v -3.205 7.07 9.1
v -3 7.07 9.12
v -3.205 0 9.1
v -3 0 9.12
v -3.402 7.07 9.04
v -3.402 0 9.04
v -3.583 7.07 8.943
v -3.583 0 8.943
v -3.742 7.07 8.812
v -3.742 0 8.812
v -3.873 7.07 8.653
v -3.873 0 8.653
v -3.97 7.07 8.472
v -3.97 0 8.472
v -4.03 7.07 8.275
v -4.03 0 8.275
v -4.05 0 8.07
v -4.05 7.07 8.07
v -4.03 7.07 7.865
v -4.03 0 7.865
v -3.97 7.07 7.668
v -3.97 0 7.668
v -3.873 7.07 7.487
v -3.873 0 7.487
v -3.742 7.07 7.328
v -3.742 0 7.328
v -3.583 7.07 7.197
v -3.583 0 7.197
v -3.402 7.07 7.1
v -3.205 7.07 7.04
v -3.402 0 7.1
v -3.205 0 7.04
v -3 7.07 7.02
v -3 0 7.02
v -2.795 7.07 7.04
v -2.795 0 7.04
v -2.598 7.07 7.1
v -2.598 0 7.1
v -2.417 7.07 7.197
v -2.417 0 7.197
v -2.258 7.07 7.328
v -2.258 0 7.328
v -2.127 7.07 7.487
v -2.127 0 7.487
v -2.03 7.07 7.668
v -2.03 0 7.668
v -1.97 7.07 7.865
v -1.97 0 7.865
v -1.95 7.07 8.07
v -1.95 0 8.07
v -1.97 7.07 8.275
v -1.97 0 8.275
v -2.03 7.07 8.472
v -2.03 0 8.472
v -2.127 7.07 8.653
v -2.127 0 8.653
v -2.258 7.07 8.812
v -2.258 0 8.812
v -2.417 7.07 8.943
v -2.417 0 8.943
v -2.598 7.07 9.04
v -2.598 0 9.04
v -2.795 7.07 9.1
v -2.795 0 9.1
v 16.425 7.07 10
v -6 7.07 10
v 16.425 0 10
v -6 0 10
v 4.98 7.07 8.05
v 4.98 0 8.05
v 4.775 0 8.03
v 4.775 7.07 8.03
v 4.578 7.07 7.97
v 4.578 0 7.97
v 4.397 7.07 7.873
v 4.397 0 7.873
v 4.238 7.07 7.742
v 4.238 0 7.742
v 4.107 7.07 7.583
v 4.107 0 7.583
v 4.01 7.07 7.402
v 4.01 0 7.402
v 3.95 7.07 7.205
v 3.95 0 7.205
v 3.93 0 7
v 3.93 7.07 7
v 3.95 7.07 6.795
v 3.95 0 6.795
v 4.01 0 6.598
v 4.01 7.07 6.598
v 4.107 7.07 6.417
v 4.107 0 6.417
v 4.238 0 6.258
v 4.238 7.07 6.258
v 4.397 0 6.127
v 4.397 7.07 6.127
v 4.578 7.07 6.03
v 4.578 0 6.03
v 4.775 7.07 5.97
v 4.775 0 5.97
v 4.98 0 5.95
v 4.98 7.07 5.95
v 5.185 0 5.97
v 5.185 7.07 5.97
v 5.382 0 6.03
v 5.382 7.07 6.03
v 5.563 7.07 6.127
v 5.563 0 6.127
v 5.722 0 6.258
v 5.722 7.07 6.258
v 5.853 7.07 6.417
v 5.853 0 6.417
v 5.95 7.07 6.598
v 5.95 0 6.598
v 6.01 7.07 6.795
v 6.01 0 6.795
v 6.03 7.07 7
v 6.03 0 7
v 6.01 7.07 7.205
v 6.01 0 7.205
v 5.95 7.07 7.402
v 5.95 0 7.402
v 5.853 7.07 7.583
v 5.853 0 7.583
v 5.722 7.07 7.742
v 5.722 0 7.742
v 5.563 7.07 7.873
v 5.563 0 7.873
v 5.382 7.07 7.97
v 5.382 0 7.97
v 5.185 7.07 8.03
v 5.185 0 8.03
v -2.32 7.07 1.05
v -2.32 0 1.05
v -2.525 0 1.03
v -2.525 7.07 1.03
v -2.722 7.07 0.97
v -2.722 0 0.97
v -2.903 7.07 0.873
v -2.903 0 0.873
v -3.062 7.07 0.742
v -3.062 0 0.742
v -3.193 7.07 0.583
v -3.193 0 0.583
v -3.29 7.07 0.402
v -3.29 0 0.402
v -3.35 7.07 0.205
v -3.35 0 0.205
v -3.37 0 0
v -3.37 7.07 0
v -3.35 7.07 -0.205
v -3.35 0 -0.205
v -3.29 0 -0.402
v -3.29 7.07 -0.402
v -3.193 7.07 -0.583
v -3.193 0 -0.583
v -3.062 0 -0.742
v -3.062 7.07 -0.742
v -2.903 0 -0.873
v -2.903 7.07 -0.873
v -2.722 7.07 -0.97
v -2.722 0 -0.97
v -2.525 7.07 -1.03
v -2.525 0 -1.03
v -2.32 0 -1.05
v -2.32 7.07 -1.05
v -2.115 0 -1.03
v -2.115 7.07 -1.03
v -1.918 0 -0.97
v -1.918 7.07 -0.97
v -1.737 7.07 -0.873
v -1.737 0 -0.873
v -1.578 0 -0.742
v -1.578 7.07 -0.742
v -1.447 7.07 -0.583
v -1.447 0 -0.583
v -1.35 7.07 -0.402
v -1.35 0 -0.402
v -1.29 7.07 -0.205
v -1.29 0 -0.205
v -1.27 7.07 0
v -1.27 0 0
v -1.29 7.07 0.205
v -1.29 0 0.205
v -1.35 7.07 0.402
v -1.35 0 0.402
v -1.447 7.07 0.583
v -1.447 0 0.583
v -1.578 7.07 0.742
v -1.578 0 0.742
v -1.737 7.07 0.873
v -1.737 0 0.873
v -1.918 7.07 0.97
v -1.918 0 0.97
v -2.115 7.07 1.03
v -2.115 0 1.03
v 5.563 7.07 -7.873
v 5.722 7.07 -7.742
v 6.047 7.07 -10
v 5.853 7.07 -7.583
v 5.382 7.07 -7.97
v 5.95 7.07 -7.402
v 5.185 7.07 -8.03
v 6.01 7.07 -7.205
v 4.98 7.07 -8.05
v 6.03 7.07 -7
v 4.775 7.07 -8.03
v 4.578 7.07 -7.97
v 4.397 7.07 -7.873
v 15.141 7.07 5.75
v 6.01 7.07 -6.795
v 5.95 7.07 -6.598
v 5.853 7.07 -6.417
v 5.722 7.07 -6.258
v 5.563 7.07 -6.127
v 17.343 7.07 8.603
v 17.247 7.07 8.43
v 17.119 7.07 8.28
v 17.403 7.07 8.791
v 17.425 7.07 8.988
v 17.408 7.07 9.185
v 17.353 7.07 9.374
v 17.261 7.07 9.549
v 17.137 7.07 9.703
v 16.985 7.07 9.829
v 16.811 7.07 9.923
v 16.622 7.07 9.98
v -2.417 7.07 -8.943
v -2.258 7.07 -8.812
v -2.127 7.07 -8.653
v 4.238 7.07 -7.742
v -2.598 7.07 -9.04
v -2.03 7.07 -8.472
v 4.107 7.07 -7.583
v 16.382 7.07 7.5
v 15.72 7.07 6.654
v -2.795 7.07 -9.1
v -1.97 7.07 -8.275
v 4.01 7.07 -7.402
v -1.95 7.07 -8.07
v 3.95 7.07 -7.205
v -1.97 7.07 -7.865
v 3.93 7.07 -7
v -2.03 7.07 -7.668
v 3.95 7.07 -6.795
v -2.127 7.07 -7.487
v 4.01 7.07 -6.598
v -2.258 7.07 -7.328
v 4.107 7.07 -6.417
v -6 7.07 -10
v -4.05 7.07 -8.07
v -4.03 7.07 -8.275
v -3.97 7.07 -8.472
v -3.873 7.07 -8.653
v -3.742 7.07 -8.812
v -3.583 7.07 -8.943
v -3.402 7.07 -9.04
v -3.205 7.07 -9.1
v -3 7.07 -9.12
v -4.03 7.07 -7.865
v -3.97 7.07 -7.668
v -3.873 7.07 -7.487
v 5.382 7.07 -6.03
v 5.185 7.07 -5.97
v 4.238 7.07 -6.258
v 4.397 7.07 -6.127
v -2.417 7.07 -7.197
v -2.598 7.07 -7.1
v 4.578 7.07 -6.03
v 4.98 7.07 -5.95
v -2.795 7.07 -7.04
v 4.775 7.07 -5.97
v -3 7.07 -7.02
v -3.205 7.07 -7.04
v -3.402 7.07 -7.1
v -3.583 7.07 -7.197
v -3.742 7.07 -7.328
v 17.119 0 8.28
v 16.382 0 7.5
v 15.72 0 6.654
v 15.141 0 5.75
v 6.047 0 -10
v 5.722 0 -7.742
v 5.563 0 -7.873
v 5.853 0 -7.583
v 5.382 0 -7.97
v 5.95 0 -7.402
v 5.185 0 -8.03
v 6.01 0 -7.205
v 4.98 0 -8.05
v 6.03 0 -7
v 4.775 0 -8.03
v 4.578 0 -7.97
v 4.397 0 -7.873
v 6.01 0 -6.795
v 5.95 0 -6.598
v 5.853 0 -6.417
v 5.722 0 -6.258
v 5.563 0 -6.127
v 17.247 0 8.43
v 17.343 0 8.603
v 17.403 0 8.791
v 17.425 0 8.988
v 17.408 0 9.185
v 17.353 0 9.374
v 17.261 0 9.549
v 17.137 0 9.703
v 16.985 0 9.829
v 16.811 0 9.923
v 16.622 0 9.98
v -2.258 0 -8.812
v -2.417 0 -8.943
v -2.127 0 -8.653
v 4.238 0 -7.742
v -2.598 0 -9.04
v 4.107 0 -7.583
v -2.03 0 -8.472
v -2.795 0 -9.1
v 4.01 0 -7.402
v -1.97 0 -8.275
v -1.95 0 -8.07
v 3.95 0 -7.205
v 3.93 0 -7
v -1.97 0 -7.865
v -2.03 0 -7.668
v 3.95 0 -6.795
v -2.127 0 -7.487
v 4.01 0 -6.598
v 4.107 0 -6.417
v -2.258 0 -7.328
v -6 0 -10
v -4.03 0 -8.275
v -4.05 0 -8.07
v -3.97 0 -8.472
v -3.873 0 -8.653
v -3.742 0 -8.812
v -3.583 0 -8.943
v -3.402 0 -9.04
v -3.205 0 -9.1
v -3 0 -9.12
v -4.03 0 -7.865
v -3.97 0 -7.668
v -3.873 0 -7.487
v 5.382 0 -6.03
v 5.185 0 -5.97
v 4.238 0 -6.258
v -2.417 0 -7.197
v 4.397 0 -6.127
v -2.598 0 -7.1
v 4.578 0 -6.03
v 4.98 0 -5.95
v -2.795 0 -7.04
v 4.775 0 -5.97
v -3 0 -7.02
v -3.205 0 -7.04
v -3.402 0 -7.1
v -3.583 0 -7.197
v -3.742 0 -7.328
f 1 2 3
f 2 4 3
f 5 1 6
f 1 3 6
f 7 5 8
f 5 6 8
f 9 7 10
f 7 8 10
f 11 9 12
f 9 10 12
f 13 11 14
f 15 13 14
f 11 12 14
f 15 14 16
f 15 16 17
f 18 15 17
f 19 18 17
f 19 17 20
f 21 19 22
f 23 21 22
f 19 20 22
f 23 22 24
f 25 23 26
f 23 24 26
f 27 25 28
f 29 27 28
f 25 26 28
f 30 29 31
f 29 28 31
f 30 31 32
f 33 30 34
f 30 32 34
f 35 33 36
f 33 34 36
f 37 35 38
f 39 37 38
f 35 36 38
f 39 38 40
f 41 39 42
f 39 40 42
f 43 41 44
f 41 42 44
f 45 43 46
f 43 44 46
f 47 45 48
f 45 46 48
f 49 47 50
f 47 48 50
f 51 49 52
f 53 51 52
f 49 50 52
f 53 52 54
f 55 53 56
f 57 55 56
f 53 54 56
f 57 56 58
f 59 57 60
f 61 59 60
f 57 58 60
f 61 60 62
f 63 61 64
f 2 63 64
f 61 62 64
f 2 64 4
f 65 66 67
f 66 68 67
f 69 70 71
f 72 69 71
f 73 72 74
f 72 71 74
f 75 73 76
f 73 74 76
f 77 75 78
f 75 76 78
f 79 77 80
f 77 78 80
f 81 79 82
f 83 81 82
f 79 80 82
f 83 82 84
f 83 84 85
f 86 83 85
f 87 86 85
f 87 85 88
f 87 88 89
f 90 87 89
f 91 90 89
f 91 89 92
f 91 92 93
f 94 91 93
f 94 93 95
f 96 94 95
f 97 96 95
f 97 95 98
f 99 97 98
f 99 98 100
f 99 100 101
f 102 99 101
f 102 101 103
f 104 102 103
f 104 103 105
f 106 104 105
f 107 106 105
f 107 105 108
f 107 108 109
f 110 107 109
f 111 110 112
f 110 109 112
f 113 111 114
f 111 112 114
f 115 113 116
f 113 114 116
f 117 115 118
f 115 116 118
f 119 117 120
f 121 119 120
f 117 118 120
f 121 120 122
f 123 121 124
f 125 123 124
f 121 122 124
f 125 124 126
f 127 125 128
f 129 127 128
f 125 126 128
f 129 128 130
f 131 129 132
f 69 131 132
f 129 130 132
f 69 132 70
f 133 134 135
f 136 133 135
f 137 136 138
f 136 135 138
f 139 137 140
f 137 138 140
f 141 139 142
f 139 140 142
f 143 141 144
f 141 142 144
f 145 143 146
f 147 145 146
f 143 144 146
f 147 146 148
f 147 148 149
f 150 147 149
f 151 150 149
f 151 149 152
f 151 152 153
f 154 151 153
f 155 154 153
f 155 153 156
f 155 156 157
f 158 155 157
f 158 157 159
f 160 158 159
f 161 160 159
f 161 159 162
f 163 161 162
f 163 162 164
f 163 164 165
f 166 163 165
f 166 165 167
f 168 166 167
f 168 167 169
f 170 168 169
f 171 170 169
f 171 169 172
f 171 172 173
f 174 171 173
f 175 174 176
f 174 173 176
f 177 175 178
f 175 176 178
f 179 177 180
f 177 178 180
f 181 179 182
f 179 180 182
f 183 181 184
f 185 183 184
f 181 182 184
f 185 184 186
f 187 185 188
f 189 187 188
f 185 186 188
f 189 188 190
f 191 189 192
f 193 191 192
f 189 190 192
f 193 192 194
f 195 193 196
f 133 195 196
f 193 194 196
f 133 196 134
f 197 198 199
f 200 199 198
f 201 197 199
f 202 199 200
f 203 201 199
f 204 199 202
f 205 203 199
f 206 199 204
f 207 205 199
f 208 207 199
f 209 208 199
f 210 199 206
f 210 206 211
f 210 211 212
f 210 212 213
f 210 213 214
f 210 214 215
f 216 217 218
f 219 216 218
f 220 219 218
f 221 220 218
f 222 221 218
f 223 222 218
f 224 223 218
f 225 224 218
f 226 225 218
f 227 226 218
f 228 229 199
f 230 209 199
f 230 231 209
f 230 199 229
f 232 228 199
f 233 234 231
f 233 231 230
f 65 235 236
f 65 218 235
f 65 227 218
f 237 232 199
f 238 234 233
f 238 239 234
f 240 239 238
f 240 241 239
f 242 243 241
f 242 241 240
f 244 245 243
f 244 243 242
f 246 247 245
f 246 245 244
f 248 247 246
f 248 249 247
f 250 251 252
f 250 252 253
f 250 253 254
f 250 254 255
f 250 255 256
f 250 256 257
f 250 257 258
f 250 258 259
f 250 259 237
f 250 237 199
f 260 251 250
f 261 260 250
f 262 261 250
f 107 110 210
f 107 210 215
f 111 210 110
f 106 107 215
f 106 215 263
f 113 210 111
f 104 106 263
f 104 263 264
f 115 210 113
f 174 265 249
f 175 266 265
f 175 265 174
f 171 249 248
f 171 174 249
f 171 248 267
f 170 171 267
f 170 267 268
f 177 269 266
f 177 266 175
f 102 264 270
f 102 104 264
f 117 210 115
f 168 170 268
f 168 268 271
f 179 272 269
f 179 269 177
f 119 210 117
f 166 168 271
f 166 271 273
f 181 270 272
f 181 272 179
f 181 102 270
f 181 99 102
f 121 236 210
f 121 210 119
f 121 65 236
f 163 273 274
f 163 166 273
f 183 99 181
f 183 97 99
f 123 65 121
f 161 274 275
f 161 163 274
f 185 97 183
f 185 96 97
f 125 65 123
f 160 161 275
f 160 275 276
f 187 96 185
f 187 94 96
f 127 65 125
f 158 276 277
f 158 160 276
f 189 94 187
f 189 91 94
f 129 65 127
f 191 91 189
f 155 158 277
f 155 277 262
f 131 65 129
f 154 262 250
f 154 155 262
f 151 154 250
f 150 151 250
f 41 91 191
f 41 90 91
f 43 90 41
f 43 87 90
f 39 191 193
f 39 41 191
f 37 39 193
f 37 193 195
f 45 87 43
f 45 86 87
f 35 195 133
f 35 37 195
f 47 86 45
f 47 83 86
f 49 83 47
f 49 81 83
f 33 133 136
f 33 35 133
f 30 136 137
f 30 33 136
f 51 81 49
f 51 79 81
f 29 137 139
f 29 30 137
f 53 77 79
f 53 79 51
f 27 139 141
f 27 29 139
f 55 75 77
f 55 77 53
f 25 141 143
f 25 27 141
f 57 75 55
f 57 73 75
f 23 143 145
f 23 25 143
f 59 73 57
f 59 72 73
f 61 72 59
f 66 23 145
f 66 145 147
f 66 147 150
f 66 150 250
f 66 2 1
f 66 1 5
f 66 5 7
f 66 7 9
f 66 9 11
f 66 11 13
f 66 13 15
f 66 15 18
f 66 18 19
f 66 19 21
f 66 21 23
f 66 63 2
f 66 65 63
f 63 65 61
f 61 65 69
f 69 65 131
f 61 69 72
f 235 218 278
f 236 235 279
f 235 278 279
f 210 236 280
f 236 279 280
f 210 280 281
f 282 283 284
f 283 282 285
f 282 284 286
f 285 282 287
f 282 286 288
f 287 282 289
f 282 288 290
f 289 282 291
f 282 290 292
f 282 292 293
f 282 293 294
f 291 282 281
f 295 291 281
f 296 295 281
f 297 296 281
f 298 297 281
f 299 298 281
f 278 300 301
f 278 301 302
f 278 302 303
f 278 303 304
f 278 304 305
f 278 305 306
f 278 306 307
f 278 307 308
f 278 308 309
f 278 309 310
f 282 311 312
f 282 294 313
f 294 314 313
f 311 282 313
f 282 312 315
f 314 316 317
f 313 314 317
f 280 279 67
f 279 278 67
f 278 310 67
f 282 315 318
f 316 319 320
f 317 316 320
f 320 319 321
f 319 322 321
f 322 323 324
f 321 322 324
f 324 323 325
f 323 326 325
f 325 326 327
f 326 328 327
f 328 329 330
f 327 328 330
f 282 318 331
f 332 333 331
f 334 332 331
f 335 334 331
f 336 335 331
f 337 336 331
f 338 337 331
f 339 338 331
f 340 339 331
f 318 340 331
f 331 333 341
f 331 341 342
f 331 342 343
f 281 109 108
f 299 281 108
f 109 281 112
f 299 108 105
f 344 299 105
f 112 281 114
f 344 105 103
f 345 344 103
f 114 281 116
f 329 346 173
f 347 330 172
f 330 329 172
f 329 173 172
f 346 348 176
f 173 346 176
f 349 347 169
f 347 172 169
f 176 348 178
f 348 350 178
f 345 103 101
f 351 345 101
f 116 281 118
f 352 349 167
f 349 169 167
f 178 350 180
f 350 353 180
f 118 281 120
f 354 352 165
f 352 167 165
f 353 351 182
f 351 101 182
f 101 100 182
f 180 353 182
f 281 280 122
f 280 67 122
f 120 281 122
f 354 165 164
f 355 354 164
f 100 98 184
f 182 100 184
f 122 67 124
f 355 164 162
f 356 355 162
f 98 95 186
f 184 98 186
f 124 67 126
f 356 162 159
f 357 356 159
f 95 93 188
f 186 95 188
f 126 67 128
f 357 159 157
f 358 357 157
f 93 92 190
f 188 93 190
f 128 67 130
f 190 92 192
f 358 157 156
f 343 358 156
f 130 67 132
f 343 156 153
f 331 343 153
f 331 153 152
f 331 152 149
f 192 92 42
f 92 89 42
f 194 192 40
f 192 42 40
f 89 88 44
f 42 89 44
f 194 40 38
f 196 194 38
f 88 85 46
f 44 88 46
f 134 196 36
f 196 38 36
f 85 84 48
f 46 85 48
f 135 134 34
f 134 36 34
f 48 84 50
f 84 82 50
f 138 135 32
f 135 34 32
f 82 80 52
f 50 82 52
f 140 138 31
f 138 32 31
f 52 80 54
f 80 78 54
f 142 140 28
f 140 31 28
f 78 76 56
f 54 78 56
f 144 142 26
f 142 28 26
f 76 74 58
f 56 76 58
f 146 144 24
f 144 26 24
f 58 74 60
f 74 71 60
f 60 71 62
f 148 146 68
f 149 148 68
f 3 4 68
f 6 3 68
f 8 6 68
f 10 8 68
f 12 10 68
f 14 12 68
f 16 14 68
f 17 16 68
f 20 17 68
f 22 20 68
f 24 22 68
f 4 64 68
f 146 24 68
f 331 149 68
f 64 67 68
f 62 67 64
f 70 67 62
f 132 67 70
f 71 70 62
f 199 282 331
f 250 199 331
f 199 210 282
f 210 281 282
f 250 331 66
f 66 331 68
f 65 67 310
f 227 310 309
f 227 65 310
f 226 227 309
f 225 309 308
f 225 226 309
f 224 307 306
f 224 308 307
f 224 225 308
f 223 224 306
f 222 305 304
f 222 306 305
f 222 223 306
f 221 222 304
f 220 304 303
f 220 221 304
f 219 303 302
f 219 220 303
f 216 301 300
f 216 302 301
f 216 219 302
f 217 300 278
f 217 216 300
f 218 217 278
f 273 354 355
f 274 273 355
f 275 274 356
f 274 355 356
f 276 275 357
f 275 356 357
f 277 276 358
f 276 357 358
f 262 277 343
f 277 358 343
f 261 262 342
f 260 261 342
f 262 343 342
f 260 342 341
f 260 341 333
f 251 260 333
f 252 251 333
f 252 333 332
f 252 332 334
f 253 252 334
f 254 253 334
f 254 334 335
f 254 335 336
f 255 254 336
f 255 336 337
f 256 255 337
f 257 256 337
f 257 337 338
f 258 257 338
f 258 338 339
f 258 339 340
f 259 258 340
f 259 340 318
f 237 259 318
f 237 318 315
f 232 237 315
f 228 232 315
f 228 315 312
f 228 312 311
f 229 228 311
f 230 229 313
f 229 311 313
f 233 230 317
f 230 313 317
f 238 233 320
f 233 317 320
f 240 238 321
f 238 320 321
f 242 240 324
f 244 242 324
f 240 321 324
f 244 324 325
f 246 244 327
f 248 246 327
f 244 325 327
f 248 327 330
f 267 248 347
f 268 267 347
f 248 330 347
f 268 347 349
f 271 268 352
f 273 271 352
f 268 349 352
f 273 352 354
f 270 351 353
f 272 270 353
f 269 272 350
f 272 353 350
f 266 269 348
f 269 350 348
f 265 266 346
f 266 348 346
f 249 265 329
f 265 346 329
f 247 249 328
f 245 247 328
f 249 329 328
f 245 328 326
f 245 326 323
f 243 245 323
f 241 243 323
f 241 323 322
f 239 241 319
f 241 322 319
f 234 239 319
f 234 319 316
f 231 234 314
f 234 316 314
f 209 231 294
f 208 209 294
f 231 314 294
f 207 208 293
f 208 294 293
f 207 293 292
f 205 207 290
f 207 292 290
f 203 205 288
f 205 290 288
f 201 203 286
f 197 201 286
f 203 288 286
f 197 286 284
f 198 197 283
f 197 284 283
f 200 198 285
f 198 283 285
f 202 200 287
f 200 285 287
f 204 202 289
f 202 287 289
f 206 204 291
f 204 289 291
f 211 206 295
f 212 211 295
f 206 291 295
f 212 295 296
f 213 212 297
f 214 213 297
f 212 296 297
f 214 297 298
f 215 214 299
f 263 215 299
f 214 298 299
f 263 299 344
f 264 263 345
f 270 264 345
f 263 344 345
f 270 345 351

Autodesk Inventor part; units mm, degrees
ref_plane "YZ Plane" through (0, 0, 0) normal (1, 0, 0) x (0, 1, 0)
ref_plane "XZ Plane" through (0, 0, 0) normal (0, 1, 0) x (-1, 0, 0)
ref_plane "XY Plane" through (0, 0, 0) normal (0, 0, 1) x (1, 0, 0)
sketch "Sketch1" plane through (0, 0, 0) normal (0, 1, 0) x (-1, 0, 0)
  line L0 (4, 10) -> (-19.4211, 10)
  line L1 (-19.4211, -10) -> (4, -10)
  line L2 (4, -10) -> (4, 10)
  arc A0 (-19.4211, -10) -> (-19.4211, 10) centre (-25.1, 0) ccw
  line L3 (4, -10) -> (6, -10)
  line L4 (6, -10) -> (6, 10)
  line L5 (6, 10) -> (4, 10)
  line L6 (4, 10) -> (4, -10)
  point P0 (0, 0)
  dimension "d0" = 20
  dimension "d2" = 4
  dimension "d3" = 10
  dimension "d6" = 10
  dimension "d7" = 23
  dimension "d8" = 29.1
  dimension "d11" = 23.4211
  dimension "d12" = 20
  dimension "d13" = 2
extrude "Extrusion1" add sketch "Sketch1" along normal blind 7.07
fillet "Fillet1" radius 1 2 edges at (19.4211, 3.535, 10) (19.4211, 3.535, -10)
sketch "Sketch2" plane through (0, 7.07, 0) normal (0, 1, 0) x (1, 0, 0)
  circle A0 centre (0.68, 0) radius 0.7835 projected
  circle A1 centre (7.98, -7) radius 0.7835 projected
  circle A2 centre (7.98, 7) radius 0.7835 projected
  circle A3 centre (0, -8.07) radius 0.7835 projected
  circle A4 centre (0, 8.07) radius 0.7835 projected
  circle A5 centre (-3, 8.07) radius 1.05
  circle A6 centre (4.98, 7) radius 1.05
  circle A7 centre (-2.32, 0) radius 1.05
  circle A8 centre (4.98, -7) radius 1.05
  circle A9 centre (-3, -8.07) radius 1.05
  point P0 (0, 0)
hole "Hole1" at (4.98, 7.07, 7) at (-2.32, 7.07, 0) at (-3, 7.07, 8.07) at (-3, 7.07, -8.07) at (4.98, 7.07, -7) direction (0, -1, 0) diameter 2.1 depth 7.07
sketch "Sketch3" plane through (0, 0, 0) normal (0, -1, 0) x (1, 0, 0)
  line L0 (18.1137, 10.8993) -> (3.779, -13.929)
  arc A0 (17.1193, 8.28) -> (17.1193, -8.28) centre (25.1, 0) ccw projected
  line L1 (16.4253, -10) -> (-6, -10) projected
  arc A1 (16.4253, -10) -> (17.1193, -8.28) centre (16.4253, -9) ccw projected
  point P0 (0, 0)
  point P1 (15.1407, 5.75)
  point P2 (6.0474, -10)
  dimension "d22" = 60
extrude "Extrusion2" cut sketch "Sketch3" against normal up to next
properties part number "3D_printed_part"
